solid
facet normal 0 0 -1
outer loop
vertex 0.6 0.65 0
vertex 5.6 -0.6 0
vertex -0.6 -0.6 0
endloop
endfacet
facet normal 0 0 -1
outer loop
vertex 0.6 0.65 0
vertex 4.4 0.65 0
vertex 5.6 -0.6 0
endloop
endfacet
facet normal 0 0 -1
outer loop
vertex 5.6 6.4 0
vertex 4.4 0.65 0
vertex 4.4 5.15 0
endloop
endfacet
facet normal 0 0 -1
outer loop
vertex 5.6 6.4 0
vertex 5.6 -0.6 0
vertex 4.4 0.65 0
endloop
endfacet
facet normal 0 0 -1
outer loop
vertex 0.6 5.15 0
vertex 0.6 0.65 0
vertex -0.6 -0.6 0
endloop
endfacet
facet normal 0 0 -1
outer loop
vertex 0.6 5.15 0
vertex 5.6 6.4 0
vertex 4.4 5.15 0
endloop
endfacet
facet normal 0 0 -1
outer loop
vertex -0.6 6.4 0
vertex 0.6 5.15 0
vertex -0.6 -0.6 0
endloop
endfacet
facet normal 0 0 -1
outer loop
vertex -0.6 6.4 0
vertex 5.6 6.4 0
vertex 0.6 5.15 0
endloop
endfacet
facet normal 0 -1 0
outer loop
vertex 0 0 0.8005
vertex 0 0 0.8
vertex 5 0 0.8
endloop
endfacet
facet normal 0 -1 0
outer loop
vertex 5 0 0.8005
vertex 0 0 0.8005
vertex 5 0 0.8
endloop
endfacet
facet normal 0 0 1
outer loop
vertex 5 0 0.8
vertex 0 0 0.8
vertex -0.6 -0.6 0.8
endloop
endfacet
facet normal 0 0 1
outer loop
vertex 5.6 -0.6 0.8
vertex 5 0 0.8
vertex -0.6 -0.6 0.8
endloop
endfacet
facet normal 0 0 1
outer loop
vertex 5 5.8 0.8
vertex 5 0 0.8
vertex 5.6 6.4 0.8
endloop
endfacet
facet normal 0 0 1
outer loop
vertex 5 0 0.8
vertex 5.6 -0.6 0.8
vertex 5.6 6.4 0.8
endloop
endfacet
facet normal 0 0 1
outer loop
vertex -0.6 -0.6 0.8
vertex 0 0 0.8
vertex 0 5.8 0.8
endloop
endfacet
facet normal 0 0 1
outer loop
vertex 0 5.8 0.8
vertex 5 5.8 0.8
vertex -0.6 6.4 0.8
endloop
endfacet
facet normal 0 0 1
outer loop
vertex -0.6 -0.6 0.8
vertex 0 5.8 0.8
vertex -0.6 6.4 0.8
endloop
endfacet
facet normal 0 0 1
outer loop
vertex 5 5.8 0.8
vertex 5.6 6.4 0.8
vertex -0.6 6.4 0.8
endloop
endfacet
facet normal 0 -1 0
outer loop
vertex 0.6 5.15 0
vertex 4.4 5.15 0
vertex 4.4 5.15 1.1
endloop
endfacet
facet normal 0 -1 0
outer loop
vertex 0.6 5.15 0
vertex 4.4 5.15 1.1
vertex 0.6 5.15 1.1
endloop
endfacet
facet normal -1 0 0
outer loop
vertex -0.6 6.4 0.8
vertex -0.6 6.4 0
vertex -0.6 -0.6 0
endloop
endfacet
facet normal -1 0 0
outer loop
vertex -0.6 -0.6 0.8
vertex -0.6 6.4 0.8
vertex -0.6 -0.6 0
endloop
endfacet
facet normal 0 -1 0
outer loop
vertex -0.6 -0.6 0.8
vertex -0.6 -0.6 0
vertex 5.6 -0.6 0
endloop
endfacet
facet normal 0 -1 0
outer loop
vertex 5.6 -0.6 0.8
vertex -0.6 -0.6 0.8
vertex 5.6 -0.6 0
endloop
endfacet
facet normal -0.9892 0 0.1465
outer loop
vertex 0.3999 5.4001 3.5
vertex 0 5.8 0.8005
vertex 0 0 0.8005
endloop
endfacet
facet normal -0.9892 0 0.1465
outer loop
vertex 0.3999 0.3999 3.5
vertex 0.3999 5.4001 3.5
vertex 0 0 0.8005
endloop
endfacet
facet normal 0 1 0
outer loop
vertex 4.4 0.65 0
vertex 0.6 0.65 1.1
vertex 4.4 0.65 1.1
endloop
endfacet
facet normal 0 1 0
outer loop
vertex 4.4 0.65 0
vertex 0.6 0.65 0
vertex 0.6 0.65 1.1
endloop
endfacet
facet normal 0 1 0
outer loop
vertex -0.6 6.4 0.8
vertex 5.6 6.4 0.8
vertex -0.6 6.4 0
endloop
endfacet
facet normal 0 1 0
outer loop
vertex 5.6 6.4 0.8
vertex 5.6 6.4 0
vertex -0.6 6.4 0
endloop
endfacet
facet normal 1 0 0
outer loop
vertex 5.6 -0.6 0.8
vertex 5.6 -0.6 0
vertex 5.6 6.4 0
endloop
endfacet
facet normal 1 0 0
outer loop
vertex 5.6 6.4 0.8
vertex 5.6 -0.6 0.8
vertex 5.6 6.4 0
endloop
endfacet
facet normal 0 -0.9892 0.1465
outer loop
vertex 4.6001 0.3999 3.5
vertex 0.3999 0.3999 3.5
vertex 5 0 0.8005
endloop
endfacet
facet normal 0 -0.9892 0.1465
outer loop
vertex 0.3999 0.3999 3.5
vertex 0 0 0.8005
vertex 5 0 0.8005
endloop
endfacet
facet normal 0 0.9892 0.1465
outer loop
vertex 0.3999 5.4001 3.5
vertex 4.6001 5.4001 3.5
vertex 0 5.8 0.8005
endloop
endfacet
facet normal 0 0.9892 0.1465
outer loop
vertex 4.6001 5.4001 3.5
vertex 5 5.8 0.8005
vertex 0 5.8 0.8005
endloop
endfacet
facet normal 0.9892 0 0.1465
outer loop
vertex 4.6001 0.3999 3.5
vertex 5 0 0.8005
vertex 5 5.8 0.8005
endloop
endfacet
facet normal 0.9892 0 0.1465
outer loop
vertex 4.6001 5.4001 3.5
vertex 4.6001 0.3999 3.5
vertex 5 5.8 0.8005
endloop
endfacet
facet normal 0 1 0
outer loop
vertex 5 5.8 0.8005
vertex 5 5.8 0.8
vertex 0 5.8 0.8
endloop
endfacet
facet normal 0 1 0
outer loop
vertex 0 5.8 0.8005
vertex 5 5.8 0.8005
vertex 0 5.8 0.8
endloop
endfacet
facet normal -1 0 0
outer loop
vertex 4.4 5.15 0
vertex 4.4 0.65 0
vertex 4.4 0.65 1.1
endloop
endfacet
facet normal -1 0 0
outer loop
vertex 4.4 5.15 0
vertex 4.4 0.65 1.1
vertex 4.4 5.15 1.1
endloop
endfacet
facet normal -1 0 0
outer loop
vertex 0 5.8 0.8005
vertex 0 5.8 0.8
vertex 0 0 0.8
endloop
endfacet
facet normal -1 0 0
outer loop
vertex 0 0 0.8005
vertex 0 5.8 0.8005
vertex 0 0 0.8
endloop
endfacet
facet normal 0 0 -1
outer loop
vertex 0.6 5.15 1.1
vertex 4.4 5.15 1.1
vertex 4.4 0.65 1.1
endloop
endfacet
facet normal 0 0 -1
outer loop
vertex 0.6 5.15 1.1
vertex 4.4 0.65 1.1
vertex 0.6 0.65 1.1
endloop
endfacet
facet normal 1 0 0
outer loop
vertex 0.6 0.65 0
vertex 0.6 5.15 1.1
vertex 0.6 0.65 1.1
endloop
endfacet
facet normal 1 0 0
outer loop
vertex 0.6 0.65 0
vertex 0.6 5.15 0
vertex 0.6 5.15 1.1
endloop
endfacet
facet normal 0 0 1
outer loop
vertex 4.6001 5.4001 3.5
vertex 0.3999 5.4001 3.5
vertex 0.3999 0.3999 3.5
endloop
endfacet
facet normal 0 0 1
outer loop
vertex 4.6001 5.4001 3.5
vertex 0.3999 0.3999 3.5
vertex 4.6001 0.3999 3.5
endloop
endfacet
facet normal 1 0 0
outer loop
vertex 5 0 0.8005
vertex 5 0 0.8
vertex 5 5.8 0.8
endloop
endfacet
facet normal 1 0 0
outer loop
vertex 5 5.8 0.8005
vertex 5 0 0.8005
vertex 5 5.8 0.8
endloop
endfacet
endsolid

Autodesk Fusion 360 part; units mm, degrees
sketch "Sketch1" plane through (0, 0, 0) normal (0, 0, 1) x (1, 0, 0)
  line L0 (0, 0) -> (5, 0)
  line L1 (5, 0) -> (5, 5.8)
  line L2 (5, 5.8) -> (0, 5.8)
  line L3 (0, 5.8) -> (0, 0)
  dimension "d1" = 5
  dimension "d2" = 5.8
extrude "Extrude1" add sketch "Sketch1" along normal blind 3.5
sketch "Sketch2" plane through (0, 0, 0) normal (0, 0, -1) x (-1, 0, 0)
  line L0 (0, 0) -> (0, 5.8)
  line L1 (0, 5.8) -> (-5, 5.8)
  line L2 (-5, 5.8) -> (-5, 0)
  line L3 (-5, 0) -> (0, 0)
  line L4 (-4.4, 5.15) -> (-0.6, 5.15)
  line L5 (-0.6, 5.15) -> (-0.6, 0.65)
  line L6 (-0.6, 0.65) -> (-4.4, 0.65)
  line L7 (-4.4, 0.65) -> (-4.4, 5.15)
  dimension "d5" = 3.8
  dimension "d6" = 4.5
  dimension "d7" = 0.6
  dimension "d8" = 0.65
extrude "Extrude2" cut sketch "Sketch2" against normal blind 1.1 contours L4 L5 L6 L7
sketch "Sketch3" plane through (0, 0, 0) normal (0, 0, -1) x (-1, 0, 0)
  line L0 (-0.6, 5.15) -> (-0.6, 0.65)
  line L1 (-0.6, 0.65) -> (-4.4, 0.65)
  line L2 (-4.4, 0.65) -> (-4.4, 5.15)
  line L3 (-4.4, 5.15) -> (-0.6, 5.15)
  line L4 (0, 0) -> (0, 5.8)
  line L5 (0, 5.8) -> (-5, 5.8)
  line L6 (-5, 5.8) -> (-5, 0)
  line L7 (-5, 0) -> (0, 0)
  line L8 (-5.6, 6.4) -> (0.6, 6.4)
  line L9 (0.6, 6.4) -> (0.6, -0.6)
  line L10 (0.6, -0.6) -> (-5.6, -0.6)
  line L11 (-5.6, -0.6) -> (-5.6, 6.4)
  dimension "d11" = 0.6
  dimension "d12" = 0.6
  dimension "d13" = 0.6
  dimension "d14" = 0.6
extrude "Extrude3" add sketch "Sketch3" against normal blind 0.8 contours L8 L9 L10 L11
chamfer "Chamfer1" distance 0.4 distance2 2.7 4 edges at (5, 2.9, 3.5) (2.5, 5.8, 3.5) (0, 2.9, 3.5) (2.5, 0, 3.5) measured on face at (1.6667, 3.8667, 3.5) measured on face at (1.6667, 3.8667, 3.5) measured on face at (1.6667, 3.8667, 3.5) measured on face at (1.6667, 3.8667, 3.5)
